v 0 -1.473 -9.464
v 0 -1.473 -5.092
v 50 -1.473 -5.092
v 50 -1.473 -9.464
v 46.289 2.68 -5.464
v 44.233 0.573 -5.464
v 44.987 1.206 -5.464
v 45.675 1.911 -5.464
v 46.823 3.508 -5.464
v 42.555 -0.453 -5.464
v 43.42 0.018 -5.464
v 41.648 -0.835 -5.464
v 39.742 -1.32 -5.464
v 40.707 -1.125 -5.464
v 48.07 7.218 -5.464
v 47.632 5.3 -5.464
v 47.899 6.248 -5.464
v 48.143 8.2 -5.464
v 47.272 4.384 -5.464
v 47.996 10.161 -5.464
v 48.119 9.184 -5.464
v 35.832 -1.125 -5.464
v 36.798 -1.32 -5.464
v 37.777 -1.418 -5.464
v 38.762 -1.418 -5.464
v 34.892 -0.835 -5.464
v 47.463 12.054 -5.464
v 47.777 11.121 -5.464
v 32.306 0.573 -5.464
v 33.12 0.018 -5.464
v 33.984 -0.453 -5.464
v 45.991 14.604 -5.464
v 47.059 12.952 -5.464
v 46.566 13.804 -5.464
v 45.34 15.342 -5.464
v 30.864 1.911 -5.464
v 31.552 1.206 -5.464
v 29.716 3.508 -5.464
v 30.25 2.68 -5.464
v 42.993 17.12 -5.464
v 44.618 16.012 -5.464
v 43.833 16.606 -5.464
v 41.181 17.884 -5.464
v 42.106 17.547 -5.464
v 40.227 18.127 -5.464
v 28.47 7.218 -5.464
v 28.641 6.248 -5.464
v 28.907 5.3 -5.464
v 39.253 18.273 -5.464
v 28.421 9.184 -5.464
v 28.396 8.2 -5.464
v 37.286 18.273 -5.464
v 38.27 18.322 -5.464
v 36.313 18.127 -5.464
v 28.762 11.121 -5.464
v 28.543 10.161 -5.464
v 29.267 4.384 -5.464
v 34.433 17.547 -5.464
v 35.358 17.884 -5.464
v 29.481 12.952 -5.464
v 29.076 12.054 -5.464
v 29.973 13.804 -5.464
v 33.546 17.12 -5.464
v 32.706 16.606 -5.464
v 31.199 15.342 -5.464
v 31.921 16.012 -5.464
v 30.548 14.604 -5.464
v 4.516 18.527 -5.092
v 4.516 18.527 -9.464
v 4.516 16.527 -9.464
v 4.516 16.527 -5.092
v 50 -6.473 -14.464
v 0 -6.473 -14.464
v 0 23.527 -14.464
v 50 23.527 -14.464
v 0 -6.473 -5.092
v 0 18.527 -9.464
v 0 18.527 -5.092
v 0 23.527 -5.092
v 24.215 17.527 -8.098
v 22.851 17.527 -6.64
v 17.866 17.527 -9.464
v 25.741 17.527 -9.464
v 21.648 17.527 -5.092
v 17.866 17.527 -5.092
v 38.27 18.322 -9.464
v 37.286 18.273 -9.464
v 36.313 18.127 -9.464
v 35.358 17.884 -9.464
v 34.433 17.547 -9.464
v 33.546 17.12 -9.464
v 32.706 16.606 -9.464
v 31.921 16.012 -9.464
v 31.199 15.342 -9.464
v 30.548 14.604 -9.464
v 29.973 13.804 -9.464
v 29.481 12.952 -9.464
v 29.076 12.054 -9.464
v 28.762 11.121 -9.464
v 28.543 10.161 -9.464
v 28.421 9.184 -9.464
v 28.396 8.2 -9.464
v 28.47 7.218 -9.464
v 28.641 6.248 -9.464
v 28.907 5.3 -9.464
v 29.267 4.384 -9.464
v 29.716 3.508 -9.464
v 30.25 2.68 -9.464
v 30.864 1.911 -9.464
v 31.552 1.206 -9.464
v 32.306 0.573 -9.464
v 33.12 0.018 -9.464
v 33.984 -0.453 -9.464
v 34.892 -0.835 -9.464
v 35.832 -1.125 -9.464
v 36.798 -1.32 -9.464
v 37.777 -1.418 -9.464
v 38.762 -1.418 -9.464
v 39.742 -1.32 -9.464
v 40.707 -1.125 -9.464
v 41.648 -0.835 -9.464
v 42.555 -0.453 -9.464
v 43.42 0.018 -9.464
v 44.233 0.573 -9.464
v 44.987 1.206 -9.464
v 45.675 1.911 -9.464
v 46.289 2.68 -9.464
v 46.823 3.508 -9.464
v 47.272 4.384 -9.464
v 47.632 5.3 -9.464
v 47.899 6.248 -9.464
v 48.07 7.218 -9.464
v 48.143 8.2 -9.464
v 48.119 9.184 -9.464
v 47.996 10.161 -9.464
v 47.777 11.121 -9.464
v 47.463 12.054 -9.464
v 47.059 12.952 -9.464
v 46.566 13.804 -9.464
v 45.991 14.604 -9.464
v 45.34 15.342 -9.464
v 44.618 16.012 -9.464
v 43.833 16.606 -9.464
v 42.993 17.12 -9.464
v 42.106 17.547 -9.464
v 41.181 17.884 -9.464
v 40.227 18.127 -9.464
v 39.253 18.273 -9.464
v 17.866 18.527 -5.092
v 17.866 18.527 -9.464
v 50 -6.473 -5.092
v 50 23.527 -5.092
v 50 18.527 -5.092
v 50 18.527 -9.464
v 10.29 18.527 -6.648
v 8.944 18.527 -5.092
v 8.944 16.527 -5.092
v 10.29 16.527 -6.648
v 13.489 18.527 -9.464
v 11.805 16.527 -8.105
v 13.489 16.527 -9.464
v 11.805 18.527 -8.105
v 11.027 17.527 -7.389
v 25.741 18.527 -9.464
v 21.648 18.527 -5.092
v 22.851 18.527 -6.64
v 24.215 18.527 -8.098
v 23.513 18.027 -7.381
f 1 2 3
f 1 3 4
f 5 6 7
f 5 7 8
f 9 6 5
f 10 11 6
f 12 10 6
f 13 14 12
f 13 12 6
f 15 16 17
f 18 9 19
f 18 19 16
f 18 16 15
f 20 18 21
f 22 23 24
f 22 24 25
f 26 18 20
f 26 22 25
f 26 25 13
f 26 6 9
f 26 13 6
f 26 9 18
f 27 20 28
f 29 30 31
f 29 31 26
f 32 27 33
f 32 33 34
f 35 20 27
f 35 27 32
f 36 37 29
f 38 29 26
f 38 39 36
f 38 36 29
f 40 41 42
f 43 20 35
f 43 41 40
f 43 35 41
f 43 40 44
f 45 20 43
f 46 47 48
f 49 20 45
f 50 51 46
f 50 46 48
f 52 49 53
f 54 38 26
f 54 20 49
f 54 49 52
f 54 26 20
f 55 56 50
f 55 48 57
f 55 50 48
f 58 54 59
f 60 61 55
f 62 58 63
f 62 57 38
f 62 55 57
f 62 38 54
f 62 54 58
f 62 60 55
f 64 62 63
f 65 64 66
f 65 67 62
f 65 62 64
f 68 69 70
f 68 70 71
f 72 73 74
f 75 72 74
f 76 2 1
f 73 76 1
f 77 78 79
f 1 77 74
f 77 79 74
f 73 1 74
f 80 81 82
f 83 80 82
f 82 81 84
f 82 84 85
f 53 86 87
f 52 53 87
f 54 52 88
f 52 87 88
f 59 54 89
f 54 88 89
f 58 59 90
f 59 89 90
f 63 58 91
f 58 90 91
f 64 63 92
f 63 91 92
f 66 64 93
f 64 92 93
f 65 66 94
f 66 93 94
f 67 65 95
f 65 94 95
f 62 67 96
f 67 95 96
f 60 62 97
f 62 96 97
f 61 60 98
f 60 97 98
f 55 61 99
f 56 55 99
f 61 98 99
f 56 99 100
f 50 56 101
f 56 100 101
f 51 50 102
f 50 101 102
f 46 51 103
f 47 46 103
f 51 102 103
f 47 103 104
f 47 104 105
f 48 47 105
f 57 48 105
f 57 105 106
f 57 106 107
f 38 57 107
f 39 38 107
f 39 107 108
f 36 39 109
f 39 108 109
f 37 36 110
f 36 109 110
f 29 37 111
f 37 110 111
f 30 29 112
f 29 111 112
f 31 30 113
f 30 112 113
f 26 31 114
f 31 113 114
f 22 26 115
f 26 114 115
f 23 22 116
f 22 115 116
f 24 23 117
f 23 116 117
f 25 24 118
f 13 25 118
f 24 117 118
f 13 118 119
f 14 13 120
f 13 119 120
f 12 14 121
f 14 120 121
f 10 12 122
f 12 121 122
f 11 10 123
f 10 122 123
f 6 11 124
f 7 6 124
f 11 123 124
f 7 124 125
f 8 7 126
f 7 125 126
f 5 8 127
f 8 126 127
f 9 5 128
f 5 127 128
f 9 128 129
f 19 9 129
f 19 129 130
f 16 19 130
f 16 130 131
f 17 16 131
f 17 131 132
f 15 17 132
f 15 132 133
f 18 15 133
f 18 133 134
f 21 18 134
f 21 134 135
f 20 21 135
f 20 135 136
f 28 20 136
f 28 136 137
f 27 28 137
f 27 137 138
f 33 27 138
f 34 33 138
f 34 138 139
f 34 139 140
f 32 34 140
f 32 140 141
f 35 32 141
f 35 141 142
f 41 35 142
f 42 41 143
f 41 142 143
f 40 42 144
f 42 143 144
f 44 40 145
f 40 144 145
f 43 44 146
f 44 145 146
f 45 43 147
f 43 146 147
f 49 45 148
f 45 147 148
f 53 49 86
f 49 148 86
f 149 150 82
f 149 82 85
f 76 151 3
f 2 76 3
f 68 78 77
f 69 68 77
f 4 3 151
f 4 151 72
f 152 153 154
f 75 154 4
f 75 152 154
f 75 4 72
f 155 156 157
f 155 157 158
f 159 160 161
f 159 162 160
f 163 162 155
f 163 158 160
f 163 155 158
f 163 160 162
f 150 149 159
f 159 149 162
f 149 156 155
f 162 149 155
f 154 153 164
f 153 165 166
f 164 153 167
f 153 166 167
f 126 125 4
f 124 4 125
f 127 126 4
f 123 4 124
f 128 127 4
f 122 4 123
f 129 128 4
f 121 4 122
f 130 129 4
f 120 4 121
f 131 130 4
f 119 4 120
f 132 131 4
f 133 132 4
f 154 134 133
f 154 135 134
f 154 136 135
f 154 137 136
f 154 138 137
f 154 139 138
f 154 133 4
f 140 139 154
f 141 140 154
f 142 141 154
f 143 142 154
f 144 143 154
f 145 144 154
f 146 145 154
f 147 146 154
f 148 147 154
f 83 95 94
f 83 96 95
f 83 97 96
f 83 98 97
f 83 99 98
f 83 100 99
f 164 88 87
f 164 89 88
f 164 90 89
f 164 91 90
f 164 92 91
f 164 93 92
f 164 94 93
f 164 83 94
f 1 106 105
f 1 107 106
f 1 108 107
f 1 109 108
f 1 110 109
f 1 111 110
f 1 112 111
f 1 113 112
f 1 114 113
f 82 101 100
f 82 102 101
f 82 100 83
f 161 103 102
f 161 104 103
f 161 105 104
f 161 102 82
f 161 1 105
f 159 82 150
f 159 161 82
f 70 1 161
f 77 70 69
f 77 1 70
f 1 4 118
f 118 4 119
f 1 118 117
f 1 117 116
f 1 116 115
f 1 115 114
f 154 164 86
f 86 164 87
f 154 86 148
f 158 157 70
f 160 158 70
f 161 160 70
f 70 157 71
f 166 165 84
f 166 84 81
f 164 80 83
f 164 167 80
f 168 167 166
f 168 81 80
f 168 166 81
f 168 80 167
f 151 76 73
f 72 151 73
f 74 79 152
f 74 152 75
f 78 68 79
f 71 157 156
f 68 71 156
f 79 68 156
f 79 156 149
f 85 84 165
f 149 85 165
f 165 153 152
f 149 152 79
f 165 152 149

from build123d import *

# Parameters (mm, degrees)
SKETCH1_W           = 5
SKETCH1_H           = 20
SKETCH1_W_2         = 20
SKETCH1_H_2         = 5
BOSS_EXTRUDE2_DEPTH = 50
BOSS_EXTRUDE3_DEPTH = 2
BOSS_EXTRUDE4_DEPTH = 1
SKETCH5_W           = 10.627555573
SKETCH5_H           = 30
CUT_EXTRUDE1_DEPTH  = 410
SKETCH6_R           = 9.876593792
BOSS_EXTRUDE5_DEPTH = 4


with BuildPart() as part:
    # Sketch1 → Boss-Extrude2 (new body)
    with BuildSketch(Plane(origin=(0, 0, 0), x_dir=(0, 0, -1), z_dir=(1, 0, 0))):
        with Locations((11.964285714, 8.526785714)):
            Rectangle(SKETCH1_W, SKETCH1_H)
        with Locations((4.464285714, 21.026785714)):
            Rectangle(SKETCH1_W_2, SKETCH1_H_2)
        with Locations((4.464285714, -3.973214286)):
            Rectangle(SKETCH1_W_2, SKETCH1_H_2)
    extrude(amount=BOSS_EXTRUDE2_DEPTH)

    # Sketch2 → Boss-Extrude3 (add)
    with BuildSketch(Plane.XZ.offset(-18.526785714)):
        with BuildLine():
            Line((4.515759803, -9.464285714), (4.515759803, 5.535714286))
            add(Edge.make_bspline(
                [(4.515759803, 5.535714286), (5.848786982, -3.806136343), (13.48902105, -9.464285714)],
                knots=[0, 0, 0, 1, 1, 1], degree=2))
            Line((13.48902105, -9.464285714), (4.515759803, -9.464285714))
        make_face()
    extrude(amount=BOSS_EXTRUDE3_DEPTH)

    # Sketch4 → Boss-Extrude4 (add)
    with BuildSketch(Plane.XZ.offset(-18.526785714)):
        with BuildLine():
            Line((17.865518754, -10.317847861), (17.865518754, 5.535714286))
            add(Edge.make_bspline(
                [(17.865518754, 5.535714286), (18.795797839, -4.399262704), (26.838780001, -10.317847861)],
                knots=[0, 0, 0, 1, 1, 1], degree=2))
            Line((26.838780001, -10.317847861), (17.865518754, -10.317847861))
        make_face()
    extrude(amount=BOSS_EXTRUDE4_DEPTH)

    # Sketch5 → Cut-Extrude1 (cut)
    with BuildSketch(Plane(origin=(50, 0, 0), x_dir=(0, 0, -1), z_dir=(1, 0, 0))):
        with Locations((-0.221936499, 8.526785714)):
            Rectangle(SKETCH5_W, SKETCH5_H)
    extrude(amount=-CUT_EXTRUDE1_DEPTH, mode=Mode.SUBTRACT)

    # Sketch6 → Boss-Extrude5 (add)
    with BuildSketch(Plane.XY.offset(-9.464285714)):
        with Locations(Location((38.269602277, 8.445873505, 0), (0, 0, 90))):
            Circle(SKETCH6_R)
    extrude(amount=BOSS_EXTRUDE5_DEPTH)


solid = part.part
